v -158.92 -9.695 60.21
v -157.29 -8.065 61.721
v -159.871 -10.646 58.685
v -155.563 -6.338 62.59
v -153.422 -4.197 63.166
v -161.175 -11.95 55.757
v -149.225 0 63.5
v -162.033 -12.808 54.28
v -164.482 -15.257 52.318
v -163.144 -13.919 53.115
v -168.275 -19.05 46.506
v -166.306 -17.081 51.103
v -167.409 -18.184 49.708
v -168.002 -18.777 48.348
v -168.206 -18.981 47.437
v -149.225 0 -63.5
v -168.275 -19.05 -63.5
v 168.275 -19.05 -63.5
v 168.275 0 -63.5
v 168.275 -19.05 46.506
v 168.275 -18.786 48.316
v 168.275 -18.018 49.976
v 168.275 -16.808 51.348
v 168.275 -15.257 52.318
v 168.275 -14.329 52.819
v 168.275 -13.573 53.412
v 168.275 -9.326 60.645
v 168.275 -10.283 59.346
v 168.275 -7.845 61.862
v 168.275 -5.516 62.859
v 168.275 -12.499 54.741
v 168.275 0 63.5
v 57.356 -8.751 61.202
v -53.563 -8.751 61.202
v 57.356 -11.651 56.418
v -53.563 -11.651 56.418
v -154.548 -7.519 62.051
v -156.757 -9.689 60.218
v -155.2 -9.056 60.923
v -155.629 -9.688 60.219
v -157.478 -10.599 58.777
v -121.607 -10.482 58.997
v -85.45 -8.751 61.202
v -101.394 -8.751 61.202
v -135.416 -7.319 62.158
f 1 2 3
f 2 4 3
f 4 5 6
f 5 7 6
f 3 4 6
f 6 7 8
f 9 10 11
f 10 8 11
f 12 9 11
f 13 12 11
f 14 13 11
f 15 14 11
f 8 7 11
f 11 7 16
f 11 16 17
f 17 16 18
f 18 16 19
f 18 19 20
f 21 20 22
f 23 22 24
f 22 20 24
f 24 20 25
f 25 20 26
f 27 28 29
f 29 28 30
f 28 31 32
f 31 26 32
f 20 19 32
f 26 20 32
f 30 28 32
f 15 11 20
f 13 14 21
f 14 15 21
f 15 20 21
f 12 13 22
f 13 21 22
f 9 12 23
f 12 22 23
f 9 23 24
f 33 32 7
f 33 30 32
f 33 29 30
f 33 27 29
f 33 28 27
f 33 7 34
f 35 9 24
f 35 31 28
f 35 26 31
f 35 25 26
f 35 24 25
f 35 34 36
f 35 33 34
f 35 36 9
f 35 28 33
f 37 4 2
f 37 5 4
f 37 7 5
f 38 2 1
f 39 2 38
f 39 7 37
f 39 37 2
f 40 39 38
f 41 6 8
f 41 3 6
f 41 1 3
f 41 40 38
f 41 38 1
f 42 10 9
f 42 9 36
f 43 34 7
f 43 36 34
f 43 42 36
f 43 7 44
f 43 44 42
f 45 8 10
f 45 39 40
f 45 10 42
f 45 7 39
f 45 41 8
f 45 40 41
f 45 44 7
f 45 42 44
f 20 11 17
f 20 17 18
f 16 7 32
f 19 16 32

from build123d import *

# Parameters (mm, degrees)
F0_W     = 336.55
F0_H     = 127
F1_DEPTH = 19.05
F3_DEPTH = 336.551
F5_DEPTH = 127.0010001


with BuildPart() as f1:
    # F0 (on Front) → F1 (new body)
    with BuildSketch(Plane.XZ):
        Rectangle(F0_W, F0_H)
    extrude(amount=F1_DEPTH)

    # F2 (on face) → F3 (cut, through all)
    with BuildSketch(Plane.YZ.offset(168.275)):
        with BuildLine():
            add(Edge.make_bspline(
                [(0, 63.5), (-13.8609133718, 63.5), (-9.1129885479, 55.0204556119), (-15.256598862, 52.3182653746)],
                knots=[0, 0, 0, 0, 19.4568359991, 19.4568359991, 19.4568359991, 19.4568359991], degree=3))
            Line((0, 63.5), (-19.05, 63.5))
            Line((-19.05, 63.5), (-19.05, 51.528967917))
            add(Edge.make_bspline(
                [(-15.256598862, 52.3182653746), (-16.2172018341, 51.8957561593), (-17.4440793365, 51.6144907855), (-19.05, 51.528967917)],
                knots=[19.4568359991, 19.4568359991, 19.4568359991, 19.4568359991, 22.4990690726, 22.4990690726, 22.4990690726, 22.4990690726], degree=3))
        make_face()
        with BuildLine():
            ThreePointArc((-19.05, 46.505666794), (-18.0177487141, 49.976120455), (-15.256598862, 52.3182653746))
            add(Edge.make_bspline(
                [(-15.256598862, 52.3182653746), (-16.2172018341, 51.8957561593), (-17.4440793365, 51.6144907855), (-19.05, 51.528967917)],
                knots=[19.4568359991, 19.4568359991, 19.4568359991, 19.4568359991, 22.4990690726, 22.4990690726, 22.4990690726, 22.4990690726], degree=3))
            Line((-19.05, 51.528967917), (-19.05, 46.505666794))
        make_face()
    extrude(amount=-F3_DEPTH, mode=Mode.SUBTRACT)

    # F4 (on face) → F5 (cut, through all)
    with BuildSketch(Plane(origin=(0, 0, -63.5), x_dir=(1, 0, 0), z_dir=(0, 0, -1))):
        Polygon((-149.225, 0), (-168.275, 19.05), (-168.275, 0), align=None)
    extrude(amount=-F5_DEPTH, mode=Mode.SUBTRACT)


solid = f1.part
